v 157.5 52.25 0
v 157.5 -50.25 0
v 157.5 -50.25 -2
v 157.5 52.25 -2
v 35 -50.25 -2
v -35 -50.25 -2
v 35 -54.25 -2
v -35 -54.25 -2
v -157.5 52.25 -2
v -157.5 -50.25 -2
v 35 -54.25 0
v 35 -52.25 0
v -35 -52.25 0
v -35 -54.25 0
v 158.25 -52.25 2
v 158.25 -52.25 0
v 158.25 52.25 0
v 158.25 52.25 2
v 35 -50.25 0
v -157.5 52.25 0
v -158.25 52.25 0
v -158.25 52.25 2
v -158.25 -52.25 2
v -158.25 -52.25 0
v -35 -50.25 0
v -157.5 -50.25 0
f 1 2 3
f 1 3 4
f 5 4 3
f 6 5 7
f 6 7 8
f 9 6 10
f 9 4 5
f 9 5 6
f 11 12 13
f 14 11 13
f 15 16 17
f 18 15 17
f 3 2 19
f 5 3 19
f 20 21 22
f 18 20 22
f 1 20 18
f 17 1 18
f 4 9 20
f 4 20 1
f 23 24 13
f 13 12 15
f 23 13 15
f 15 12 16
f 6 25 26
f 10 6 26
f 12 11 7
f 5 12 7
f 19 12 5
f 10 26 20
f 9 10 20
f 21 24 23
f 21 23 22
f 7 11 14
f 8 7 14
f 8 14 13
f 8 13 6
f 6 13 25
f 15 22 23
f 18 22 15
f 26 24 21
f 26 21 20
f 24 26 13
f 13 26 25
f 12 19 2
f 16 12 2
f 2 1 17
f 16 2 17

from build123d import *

# Parameters (mm, degrees)
SKETCH1_W                                    = 316.5
SKETCH1_H                                    = 104.5
DIGITIZER_DEPTH                              = 2
SKETCH2_W                                    = 315
SKETCH2_H                                    = 102.5
DISPLAY_WITHOUT_MARGIN_SINCE_USING_2MM_DEPTH = 2
SKETCH3_W                                    = 70
SKETCH3_H                                    = 4
DIGITIZER_CABLE_DEPTH                        = 2


with BuildPart() as part:
    # Sketch1 → DIGITIZER (new body)
    with BuildSketch(Plane.XY):
        Rectangle(SKETCH1_W, SKETCH1_H)
    extrude(amount=DIGITIZER_DEPTH)

    # Sketch2 → DISPLAY WITHOUT MARGIN SINCE USING .2MM ADHESIVE NOW (add)
    with BuildSketch(Plane(origin=(0, 0, 0), x_dir=(-1, 0, 0), z_dir=(0, 0, -1))):
        with Locations((0, 1)):
            Rectangle(SKETCH2_W, SKETCH2_H)
    extrude(amount=DISPLAY_WITHOUT_MARGIN_SINCE_USING_2MM_DEPTH)

    # Sketch3 → DIGITIZER CABLE (add)
    with BuildSketch(Plane(origin=(0, 0, 0), x_dir=(-1, 0, 0), z_dir=(0, 0, -1))):
        with Locations((0, -52.25)):
            Rectangle(SKETCH3_W, SKETCH3_H)
    extrude(amount=DIGITIZER_CABLE_DEPTH)


solid = part.part
